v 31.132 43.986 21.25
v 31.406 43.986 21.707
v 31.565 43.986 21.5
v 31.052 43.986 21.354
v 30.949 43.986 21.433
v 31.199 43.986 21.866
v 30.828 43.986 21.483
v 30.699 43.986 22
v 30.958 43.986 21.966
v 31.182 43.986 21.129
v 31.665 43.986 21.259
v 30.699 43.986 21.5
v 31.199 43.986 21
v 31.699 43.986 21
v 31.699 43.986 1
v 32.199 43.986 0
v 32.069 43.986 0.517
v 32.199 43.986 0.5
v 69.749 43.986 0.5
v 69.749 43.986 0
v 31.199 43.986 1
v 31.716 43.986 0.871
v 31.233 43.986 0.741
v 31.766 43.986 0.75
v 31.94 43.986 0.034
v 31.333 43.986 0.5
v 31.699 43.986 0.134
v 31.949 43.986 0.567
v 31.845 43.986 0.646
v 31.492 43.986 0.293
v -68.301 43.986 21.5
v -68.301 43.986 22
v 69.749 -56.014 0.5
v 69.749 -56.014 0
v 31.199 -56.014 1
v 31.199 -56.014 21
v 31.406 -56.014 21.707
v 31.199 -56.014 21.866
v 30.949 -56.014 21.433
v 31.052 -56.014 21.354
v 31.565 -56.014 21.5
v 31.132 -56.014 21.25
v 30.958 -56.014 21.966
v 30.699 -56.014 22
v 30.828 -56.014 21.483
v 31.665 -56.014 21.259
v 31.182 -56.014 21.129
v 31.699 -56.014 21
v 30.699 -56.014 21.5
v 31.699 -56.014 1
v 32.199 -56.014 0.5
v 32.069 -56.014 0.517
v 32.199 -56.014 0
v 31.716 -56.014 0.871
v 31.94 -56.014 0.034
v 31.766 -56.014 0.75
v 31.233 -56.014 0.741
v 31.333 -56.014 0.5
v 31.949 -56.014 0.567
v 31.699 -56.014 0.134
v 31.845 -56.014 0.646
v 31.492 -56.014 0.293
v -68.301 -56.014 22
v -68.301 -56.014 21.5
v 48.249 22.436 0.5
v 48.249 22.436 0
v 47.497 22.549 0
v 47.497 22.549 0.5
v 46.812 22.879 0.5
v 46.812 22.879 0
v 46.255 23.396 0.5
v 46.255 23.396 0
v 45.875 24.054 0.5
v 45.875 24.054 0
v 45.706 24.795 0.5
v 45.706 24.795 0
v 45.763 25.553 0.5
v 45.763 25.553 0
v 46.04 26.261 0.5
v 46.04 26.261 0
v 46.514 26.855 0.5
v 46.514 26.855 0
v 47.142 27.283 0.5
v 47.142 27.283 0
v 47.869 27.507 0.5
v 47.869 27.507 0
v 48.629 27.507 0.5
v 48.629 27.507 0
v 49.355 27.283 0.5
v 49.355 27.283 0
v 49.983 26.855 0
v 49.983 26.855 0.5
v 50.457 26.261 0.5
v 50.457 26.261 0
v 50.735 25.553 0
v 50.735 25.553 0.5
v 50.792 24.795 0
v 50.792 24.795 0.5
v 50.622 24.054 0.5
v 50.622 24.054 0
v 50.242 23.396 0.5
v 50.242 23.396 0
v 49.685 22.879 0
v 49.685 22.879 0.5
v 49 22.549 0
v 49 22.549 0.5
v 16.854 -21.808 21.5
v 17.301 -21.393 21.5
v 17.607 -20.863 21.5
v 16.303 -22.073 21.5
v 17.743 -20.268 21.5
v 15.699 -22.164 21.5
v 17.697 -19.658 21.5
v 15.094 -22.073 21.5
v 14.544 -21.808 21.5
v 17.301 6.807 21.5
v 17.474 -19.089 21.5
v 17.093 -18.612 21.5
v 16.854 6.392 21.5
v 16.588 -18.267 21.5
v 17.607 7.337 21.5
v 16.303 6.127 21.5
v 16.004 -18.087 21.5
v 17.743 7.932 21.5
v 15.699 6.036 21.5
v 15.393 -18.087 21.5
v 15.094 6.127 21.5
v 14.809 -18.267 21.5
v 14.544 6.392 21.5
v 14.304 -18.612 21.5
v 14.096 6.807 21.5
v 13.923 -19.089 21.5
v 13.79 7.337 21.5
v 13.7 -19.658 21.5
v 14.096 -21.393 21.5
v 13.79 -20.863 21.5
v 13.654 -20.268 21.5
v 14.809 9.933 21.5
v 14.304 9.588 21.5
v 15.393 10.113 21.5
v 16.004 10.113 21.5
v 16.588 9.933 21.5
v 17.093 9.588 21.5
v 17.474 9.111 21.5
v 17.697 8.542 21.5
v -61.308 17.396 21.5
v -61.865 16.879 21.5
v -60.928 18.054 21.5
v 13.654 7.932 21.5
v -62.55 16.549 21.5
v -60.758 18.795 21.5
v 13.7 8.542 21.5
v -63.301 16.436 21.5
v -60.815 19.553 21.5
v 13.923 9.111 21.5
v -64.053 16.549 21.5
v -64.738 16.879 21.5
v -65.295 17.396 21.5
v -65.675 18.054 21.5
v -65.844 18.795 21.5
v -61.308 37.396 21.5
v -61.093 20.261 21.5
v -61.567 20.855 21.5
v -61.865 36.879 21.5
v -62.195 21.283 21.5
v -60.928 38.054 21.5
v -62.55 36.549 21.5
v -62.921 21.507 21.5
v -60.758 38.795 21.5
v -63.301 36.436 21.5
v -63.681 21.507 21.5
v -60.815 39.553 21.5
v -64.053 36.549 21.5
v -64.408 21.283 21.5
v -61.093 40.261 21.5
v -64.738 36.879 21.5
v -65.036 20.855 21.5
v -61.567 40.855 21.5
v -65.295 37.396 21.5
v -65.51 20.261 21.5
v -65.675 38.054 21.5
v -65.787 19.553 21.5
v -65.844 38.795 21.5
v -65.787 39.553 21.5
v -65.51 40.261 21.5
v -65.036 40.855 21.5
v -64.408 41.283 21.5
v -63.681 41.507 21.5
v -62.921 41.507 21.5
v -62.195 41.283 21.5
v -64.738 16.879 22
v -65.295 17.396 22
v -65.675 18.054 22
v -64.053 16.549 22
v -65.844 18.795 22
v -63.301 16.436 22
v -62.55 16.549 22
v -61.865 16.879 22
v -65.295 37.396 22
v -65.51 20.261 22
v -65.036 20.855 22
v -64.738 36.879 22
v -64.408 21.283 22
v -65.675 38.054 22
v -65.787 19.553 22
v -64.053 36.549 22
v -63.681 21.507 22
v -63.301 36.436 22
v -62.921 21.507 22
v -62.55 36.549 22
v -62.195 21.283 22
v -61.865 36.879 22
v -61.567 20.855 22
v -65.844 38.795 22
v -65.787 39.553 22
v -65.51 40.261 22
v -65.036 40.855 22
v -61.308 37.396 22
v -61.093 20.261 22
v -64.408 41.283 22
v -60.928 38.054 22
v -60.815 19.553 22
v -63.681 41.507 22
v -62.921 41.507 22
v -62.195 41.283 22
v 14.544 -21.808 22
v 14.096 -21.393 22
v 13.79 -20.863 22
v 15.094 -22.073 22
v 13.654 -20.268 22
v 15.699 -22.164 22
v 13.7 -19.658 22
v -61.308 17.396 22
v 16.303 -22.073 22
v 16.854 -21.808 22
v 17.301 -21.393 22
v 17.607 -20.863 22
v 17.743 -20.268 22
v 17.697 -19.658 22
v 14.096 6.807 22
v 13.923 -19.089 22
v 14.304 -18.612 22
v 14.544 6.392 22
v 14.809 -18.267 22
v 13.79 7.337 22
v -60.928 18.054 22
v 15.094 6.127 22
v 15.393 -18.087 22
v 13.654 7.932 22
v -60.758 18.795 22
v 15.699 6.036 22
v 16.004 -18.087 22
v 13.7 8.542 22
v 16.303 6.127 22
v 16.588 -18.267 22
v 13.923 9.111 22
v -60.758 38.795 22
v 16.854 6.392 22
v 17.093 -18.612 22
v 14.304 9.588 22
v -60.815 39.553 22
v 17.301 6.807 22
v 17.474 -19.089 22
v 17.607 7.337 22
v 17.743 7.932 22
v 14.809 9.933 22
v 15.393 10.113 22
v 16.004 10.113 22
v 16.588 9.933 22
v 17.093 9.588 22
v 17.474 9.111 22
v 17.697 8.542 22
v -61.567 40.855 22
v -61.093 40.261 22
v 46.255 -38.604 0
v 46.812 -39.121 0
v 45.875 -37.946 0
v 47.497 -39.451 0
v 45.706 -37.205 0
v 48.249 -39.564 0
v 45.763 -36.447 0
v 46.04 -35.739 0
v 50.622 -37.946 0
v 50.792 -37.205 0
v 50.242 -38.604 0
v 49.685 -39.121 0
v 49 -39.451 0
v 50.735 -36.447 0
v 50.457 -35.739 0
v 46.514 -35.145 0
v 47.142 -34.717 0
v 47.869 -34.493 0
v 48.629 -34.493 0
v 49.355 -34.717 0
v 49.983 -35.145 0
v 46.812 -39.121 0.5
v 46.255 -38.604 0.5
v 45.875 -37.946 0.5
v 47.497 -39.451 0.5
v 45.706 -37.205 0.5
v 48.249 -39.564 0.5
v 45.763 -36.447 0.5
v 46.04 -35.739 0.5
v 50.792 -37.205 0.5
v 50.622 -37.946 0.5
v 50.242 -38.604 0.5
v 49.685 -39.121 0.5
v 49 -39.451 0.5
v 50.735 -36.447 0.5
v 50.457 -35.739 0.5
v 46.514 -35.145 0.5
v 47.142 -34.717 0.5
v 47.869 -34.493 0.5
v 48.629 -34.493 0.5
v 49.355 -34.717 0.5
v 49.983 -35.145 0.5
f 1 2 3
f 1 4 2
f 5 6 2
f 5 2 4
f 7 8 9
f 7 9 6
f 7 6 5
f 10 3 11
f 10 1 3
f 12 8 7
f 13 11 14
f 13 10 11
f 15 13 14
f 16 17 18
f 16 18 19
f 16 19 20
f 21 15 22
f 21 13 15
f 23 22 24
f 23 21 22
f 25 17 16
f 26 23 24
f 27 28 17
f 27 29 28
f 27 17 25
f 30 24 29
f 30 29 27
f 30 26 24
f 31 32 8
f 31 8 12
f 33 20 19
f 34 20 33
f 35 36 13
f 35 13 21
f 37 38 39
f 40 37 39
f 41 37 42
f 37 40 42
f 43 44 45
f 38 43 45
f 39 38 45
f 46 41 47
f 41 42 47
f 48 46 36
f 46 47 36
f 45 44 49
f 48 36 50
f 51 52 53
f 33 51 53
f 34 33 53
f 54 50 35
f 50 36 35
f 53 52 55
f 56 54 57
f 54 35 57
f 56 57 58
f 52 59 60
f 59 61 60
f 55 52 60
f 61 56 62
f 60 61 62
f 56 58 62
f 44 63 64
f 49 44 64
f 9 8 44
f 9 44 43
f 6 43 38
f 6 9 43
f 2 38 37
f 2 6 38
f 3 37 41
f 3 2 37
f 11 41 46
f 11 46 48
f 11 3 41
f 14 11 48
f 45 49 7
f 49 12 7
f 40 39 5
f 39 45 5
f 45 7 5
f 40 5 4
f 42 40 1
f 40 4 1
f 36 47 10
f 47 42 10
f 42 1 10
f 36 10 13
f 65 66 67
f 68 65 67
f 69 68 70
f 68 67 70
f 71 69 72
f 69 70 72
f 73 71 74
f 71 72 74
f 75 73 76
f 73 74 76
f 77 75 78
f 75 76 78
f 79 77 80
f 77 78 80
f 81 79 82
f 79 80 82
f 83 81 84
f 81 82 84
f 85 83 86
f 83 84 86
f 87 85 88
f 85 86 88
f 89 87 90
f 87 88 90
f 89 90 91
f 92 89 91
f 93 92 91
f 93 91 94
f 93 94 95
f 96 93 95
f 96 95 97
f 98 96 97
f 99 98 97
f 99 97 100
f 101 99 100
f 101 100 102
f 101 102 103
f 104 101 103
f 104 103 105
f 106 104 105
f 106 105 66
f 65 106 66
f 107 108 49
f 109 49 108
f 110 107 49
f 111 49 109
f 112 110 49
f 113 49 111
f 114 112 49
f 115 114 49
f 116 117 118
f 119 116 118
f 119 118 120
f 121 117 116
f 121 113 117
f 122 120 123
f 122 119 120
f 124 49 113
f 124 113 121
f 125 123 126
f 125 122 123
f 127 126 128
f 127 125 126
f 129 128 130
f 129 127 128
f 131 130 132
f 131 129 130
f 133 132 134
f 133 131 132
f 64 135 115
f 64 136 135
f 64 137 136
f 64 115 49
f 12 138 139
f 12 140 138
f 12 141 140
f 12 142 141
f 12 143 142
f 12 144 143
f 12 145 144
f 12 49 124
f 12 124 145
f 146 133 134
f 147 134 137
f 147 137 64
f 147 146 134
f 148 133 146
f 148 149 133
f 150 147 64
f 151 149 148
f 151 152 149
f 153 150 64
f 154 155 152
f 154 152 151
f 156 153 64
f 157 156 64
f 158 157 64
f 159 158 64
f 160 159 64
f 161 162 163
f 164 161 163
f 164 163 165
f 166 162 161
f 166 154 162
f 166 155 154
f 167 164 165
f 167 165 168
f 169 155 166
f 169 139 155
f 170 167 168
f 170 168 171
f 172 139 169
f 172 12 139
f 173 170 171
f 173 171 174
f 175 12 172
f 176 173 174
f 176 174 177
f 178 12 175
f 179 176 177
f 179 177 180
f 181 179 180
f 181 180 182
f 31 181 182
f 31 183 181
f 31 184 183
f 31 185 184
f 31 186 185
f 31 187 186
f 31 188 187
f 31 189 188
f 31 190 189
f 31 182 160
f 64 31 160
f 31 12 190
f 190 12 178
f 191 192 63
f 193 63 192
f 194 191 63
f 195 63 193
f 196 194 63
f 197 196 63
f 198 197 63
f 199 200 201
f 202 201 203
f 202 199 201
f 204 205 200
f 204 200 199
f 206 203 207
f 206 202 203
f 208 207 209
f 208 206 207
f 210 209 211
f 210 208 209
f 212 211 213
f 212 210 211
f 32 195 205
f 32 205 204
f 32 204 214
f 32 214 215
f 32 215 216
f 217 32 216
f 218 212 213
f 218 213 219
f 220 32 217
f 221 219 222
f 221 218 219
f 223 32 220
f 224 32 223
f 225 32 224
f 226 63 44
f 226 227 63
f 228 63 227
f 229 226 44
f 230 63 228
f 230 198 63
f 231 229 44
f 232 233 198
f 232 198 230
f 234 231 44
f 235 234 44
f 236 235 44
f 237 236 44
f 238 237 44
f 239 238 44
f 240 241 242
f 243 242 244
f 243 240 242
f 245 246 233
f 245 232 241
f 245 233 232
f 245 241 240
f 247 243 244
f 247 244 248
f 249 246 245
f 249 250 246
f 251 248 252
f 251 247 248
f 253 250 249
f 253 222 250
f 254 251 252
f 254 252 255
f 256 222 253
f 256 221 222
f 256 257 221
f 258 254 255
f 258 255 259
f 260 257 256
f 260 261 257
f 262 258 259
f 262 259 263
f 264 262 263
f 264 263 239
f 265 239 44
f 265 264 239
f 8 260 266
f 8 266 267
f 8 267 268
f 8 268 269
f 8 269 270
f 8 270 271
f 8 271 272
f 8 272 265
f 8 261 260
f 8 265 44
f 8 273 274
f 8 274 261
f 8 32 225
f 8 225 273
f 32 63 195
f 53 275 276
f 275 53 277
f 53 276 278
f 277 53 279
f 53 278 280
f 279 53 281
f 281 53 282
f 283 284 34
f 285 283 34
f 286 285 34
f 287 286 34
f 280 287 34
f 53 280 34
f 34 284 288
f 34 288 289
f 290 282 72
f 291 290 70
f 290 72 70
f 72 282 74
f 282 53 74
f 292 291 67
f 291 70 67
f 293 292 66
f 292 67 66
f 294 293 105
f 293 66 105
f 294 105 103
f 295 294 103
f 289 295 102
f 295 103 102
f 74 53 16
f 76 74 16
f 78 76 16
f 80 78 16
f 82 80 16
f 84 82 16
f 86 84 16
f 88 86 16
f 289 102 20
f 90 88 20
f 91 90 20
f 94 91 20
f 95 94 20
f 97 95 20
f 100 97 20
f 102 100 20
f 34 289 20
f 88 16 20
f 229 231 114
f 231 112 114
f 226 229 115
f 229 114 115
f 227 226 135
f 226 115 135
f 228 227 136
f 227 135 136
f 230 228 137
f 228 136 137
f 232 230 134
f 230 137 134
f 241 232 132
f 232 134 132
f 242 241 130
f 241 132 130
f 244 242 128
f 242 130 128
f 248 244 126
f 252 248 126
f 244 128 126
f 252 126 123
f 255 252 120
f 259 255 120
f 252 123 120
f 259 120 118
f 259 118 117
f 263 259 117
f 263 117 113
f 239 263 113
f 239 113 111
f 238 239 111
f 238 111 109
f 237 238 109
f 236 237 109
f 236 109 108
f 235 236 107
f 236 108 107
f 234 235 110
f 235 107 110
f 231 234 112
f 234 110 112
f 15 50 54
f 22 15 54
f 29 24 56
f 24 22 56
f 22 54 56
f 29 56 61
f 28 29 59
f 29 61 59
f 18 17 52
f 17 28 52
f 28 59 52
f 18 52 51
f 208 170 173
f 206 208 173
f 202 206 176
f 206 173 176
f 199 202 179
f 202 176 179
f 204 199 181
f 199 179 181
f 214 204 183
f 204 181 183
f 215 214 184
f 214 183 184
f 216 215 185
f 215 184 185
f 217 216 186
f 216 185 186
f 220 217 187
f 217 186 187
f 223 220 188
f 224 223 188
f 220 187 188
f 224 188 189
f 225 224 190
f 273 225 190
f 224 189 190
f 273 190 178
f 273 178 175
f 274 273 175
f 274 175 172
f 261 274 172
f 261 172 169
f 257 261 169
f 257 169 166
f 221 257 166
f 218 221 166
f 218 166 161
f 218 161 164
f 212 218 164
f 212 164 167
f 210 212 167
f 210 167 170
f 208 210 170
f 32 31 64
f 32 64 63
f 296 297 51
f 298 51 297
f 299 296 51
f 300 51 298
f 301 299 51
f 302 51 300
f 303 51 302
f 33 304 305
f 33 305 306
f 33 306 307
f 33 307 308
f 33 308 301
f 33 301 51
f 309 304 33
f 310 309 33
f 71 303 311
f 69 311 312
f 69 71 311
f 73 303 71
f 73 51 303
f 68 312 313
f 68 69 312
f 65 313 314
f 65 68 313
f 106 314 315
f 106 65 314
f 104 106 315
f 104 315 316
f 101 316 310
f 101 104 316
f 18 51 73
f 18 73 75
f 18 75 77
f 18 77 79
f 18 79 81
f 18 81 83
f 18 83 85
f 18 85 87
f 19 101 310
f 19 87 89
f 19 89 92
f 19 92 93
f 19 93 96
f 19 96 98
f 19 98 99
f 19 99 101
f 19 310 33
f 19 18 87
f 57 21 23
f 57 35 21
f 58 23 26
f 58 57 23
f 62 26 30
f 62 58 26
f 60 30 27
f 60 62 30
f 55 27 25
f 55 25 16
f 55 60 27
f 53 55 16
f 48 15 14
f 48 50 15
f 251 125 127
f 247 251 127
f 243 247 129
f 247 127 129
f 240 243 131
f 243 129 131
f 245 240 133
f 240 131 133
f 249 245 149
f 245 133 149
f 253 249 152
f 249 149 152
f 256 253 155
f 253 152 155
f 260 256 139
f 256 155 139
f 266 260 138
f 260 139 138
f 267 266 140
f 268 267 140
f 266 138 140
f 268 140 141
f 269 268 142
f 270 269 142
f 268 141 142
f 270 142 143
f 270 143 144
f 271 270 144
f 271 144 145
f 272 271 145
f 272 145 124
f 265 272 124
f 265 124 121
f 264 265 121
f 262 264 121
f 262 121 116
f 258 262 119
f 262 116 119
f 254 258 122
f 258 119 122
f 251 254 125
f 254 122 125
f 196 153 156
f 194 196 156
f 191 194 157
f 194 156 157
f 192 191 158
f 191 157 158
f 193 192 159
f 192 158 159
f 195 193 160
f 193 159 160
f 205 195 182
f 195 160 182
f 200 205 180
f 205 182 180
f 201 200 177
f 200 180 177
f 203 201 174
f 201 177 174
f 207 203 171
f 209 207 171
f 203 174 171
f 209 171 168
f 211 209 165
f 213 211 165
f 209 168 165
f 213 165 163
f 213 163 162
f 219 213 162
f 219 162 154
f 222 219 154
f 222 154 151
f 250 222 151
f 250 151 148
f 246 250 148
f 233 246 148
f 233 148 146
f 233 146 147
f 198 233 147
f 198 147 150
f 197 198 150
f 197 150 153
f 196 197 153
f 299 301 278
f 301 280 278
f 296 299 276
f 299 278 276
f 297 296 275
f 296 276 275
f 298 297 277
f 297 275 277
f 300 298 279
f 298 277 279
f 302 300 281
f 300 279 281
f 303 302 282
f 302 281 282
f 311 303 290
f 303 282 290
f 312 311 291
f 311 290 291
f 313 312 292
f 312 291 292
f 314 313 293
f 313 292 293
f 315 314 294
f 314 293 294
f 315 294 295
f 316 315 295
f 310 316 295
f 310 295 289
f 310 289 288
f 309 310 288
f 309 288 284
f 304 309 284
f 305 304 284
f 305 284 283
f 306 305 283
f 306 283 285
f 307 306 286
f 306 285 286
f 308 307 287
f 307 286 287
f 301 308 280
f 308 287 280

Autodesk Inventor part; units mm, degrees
ref_plane "YZ Plane" through (0, 0, 0) normal (1, 0, 0) x (0, 1, 0)
ref_plane "XZ Plane" through (0, 0, 0) normal (0, 1, 0) x (-1, 0, 0)
ref_plane "XY Plane" through (0, 0, 0) normal (0, 0, 1) x (1, 0, 0)
sketch "Sketch1" plane through (0, 0, 0) normal (0, 0, 1) x (1, 0, 0)
  line L0 (31.1987, 43.9856) -> (69.7487, 43.9856)
  line L1 (69.7487, 43.9856) -> (69.7487, -56.0144)
  line L2 (69.7487, -56.0144) -> (31.1987, -56.0144)
  line L3 (31.1987, -56.0144) -> (31.1987, 43.9856)
  point P0 (0, 0)
  dimension "d0" = 100
  dimension "d1" = 38.55
extrude "Plate1" add sketch "Sketch1" along normal blind 0.5
sketch "Sketch2" plane through (31.6987, -56.0144, 0) normal (-1, 0, 0) x (0, -1, 0)
  line L0 (-100, 0) -> (0, 0)
  line L1 (0, 0) -> (0, 22)
  line L2 (0, 22) -> (-100, 22)
  line L3 (-100, 22) -> (-100, 0)
edge flange "Flange1" height 22 angle 90 thickness 0.5 bend radius 0.5 thickness toward (-1, 0, 0) relief tear relief width 0.5 relief depth 0.25 edges at (31.1987, -6.0144, 0.5) wall of the first edge with corners at (31.6987, 43.9856, 0) (31.6987, -56.0144, 0) (31.6987, -56.0144, 22) (31.6987, 43.9856, 22)
bend "Bend1"
corner "Corner1"
sketch "Sketch3" plane through (31.6987, 43.9856, 21.5) normal (0, 0, 1) x (1, 0, 0)
  line L0 (0, -100) -> (0, 0)
  line L1 (0, 0) -> (-100, 0)
  line L2 (-100, 0) -> (-100, -100)
  line L3 (-100, -100) -> (0, -100)
edge flange "Flange2" height 100 angle 90 thickness 0.5 bend radius 0.5 thickness toward (0, 0, 1) relief tear relief width 0.5 relief depth 0.25 edges at (31.1987, -6.0144, 22) wall of the first edge with corners at (31.6987, -56.0144, 21.5) (31.6987, 43.9856, 21.5) (-68.3013, 43.9856, 21.5) (-68.3013, -56.0144, 21.5)
bend "Bend2"
corner "Corner2"
sketch "Sketch4" plane through (0, 0, 0.5) normal (0, 0, 1) x (1, 0, 0)
  line L0 (48.2487, 25.2184) -> (48.2487, -36.8148) construction
  line L1 (32.1987, 43.9856) -> (69.7487, 43.9856) projected
  line L2 (69.7487, -56.0144) -> (32.1987, -56.0144) projected
  line L3 (69.7487, 43.9856) -> (69.7487, -56.0144) projected
  point P0 (0, 0)
  point P1 (48.2487, 24.9856)
  point P2 (48.2487, -37.0144)
  dimension "d23" = 19
  dimension "d24" = 62
  dimension "d25" = 19
  dimension "d26" = 21.5
hole "Hole1" at (48.2487, 24.9856, 0.5) at (48.2487, -37.0144, 0.5) direction (0, 0, -1) diameter 5.1 end through all
sketch "Sketch5" plane through (-68.3013, -56.0144, 22) normal (0, 0, 1) x (1, 0, 0)
  line L0 (84, 64.1) -> (84, 35.9) construction
  line L1 (0, 100) -> (99, 100) projected
  line L2 (99, 0) -> (0, 0) projected
  line L3 (99, 0) -> (99, 100) projected
  point P0 (68.3013, 56.0144)
  dimension "d34" = 28.2
  dimension "d35" = 35.9
  dimension "d36" = 35.9
  dimension "d37" = 15
hole "Hole2" at (15.6987, 8.0856, 22) at (15.6987, -20.1144, 22) direction (0, 0, -1) diameter 4.1 end through all
sketch "Sketch6" plane through (-68.3013, -56.0144, 22) normal (0, 0, 1) x (1, 0, 0)
  line L0 (5, 95) -> (5, 75) construction
  line L1 (0, 100) -> (99, 100) projected
  line L2 (0, 0) -> (0, 100) projected
  point P0 (68.3013, 56.0144)
  dimension "d45" = 20
  dimension "d46" = 5
  dimension "d47" = 5
hole "Hole3" at (-63.3013, 38.9856, 22) at (-63.3013, 18.9856, 22) direction (0, 0, -1) diameter 5.1 end through all
equation "\"d23\" = d25"
equation "\"d32\" = Thickness"
equation "\"d35\" = d36"
equation "\"d2\" = Thickness"
equation "\"d3\" = BendReliefWidth"
equation "\"d4\" = BendReliefDepth"
equation "\"d5\" = MinimumRemnant"
equation "\"d6\" = TransitionRadius"
equation "\"d9\" = BendRadius"
equation "\"d10\" = CornerReliefSize"
equation "\"d11\" = GapSize"
equation "\"d12\" = JacobiRadiusSize"
equation "\"d13\" = BendReliefWidth"
equation "\"d14\" = BendReliefDepth"
equation "\"d15\" = MinimumRemnant"
equation "\"d16\" = TransitionRadius"
equation "\"d19\" = BendRadius"
equation "\"d20\" = CornerReliefSize"
equation "\"d21\" = GapSize"
equation "\"d22\" = JacobiRadiusSize"
equation "\"BendRadius\" = Thickness"
equation "\"BendReliefWidth\" = Thickness"
equation "\"BendReliefDepth\" = 0.5 * Thickness"
equation "\"CornerReliefSize\" = 4 * Thickness"
equation "\"MinimumRemnant\" = 2 * Thickness"
equation "\"TransitionRadius\" = BendRadius"
equation "\"JacobiRadiusSize\" = BendRadius"
equation "\"GapSize\" = Thickness"
equation "\"Thickness\" = 0.5"
properties part number "Placa Montaje"
